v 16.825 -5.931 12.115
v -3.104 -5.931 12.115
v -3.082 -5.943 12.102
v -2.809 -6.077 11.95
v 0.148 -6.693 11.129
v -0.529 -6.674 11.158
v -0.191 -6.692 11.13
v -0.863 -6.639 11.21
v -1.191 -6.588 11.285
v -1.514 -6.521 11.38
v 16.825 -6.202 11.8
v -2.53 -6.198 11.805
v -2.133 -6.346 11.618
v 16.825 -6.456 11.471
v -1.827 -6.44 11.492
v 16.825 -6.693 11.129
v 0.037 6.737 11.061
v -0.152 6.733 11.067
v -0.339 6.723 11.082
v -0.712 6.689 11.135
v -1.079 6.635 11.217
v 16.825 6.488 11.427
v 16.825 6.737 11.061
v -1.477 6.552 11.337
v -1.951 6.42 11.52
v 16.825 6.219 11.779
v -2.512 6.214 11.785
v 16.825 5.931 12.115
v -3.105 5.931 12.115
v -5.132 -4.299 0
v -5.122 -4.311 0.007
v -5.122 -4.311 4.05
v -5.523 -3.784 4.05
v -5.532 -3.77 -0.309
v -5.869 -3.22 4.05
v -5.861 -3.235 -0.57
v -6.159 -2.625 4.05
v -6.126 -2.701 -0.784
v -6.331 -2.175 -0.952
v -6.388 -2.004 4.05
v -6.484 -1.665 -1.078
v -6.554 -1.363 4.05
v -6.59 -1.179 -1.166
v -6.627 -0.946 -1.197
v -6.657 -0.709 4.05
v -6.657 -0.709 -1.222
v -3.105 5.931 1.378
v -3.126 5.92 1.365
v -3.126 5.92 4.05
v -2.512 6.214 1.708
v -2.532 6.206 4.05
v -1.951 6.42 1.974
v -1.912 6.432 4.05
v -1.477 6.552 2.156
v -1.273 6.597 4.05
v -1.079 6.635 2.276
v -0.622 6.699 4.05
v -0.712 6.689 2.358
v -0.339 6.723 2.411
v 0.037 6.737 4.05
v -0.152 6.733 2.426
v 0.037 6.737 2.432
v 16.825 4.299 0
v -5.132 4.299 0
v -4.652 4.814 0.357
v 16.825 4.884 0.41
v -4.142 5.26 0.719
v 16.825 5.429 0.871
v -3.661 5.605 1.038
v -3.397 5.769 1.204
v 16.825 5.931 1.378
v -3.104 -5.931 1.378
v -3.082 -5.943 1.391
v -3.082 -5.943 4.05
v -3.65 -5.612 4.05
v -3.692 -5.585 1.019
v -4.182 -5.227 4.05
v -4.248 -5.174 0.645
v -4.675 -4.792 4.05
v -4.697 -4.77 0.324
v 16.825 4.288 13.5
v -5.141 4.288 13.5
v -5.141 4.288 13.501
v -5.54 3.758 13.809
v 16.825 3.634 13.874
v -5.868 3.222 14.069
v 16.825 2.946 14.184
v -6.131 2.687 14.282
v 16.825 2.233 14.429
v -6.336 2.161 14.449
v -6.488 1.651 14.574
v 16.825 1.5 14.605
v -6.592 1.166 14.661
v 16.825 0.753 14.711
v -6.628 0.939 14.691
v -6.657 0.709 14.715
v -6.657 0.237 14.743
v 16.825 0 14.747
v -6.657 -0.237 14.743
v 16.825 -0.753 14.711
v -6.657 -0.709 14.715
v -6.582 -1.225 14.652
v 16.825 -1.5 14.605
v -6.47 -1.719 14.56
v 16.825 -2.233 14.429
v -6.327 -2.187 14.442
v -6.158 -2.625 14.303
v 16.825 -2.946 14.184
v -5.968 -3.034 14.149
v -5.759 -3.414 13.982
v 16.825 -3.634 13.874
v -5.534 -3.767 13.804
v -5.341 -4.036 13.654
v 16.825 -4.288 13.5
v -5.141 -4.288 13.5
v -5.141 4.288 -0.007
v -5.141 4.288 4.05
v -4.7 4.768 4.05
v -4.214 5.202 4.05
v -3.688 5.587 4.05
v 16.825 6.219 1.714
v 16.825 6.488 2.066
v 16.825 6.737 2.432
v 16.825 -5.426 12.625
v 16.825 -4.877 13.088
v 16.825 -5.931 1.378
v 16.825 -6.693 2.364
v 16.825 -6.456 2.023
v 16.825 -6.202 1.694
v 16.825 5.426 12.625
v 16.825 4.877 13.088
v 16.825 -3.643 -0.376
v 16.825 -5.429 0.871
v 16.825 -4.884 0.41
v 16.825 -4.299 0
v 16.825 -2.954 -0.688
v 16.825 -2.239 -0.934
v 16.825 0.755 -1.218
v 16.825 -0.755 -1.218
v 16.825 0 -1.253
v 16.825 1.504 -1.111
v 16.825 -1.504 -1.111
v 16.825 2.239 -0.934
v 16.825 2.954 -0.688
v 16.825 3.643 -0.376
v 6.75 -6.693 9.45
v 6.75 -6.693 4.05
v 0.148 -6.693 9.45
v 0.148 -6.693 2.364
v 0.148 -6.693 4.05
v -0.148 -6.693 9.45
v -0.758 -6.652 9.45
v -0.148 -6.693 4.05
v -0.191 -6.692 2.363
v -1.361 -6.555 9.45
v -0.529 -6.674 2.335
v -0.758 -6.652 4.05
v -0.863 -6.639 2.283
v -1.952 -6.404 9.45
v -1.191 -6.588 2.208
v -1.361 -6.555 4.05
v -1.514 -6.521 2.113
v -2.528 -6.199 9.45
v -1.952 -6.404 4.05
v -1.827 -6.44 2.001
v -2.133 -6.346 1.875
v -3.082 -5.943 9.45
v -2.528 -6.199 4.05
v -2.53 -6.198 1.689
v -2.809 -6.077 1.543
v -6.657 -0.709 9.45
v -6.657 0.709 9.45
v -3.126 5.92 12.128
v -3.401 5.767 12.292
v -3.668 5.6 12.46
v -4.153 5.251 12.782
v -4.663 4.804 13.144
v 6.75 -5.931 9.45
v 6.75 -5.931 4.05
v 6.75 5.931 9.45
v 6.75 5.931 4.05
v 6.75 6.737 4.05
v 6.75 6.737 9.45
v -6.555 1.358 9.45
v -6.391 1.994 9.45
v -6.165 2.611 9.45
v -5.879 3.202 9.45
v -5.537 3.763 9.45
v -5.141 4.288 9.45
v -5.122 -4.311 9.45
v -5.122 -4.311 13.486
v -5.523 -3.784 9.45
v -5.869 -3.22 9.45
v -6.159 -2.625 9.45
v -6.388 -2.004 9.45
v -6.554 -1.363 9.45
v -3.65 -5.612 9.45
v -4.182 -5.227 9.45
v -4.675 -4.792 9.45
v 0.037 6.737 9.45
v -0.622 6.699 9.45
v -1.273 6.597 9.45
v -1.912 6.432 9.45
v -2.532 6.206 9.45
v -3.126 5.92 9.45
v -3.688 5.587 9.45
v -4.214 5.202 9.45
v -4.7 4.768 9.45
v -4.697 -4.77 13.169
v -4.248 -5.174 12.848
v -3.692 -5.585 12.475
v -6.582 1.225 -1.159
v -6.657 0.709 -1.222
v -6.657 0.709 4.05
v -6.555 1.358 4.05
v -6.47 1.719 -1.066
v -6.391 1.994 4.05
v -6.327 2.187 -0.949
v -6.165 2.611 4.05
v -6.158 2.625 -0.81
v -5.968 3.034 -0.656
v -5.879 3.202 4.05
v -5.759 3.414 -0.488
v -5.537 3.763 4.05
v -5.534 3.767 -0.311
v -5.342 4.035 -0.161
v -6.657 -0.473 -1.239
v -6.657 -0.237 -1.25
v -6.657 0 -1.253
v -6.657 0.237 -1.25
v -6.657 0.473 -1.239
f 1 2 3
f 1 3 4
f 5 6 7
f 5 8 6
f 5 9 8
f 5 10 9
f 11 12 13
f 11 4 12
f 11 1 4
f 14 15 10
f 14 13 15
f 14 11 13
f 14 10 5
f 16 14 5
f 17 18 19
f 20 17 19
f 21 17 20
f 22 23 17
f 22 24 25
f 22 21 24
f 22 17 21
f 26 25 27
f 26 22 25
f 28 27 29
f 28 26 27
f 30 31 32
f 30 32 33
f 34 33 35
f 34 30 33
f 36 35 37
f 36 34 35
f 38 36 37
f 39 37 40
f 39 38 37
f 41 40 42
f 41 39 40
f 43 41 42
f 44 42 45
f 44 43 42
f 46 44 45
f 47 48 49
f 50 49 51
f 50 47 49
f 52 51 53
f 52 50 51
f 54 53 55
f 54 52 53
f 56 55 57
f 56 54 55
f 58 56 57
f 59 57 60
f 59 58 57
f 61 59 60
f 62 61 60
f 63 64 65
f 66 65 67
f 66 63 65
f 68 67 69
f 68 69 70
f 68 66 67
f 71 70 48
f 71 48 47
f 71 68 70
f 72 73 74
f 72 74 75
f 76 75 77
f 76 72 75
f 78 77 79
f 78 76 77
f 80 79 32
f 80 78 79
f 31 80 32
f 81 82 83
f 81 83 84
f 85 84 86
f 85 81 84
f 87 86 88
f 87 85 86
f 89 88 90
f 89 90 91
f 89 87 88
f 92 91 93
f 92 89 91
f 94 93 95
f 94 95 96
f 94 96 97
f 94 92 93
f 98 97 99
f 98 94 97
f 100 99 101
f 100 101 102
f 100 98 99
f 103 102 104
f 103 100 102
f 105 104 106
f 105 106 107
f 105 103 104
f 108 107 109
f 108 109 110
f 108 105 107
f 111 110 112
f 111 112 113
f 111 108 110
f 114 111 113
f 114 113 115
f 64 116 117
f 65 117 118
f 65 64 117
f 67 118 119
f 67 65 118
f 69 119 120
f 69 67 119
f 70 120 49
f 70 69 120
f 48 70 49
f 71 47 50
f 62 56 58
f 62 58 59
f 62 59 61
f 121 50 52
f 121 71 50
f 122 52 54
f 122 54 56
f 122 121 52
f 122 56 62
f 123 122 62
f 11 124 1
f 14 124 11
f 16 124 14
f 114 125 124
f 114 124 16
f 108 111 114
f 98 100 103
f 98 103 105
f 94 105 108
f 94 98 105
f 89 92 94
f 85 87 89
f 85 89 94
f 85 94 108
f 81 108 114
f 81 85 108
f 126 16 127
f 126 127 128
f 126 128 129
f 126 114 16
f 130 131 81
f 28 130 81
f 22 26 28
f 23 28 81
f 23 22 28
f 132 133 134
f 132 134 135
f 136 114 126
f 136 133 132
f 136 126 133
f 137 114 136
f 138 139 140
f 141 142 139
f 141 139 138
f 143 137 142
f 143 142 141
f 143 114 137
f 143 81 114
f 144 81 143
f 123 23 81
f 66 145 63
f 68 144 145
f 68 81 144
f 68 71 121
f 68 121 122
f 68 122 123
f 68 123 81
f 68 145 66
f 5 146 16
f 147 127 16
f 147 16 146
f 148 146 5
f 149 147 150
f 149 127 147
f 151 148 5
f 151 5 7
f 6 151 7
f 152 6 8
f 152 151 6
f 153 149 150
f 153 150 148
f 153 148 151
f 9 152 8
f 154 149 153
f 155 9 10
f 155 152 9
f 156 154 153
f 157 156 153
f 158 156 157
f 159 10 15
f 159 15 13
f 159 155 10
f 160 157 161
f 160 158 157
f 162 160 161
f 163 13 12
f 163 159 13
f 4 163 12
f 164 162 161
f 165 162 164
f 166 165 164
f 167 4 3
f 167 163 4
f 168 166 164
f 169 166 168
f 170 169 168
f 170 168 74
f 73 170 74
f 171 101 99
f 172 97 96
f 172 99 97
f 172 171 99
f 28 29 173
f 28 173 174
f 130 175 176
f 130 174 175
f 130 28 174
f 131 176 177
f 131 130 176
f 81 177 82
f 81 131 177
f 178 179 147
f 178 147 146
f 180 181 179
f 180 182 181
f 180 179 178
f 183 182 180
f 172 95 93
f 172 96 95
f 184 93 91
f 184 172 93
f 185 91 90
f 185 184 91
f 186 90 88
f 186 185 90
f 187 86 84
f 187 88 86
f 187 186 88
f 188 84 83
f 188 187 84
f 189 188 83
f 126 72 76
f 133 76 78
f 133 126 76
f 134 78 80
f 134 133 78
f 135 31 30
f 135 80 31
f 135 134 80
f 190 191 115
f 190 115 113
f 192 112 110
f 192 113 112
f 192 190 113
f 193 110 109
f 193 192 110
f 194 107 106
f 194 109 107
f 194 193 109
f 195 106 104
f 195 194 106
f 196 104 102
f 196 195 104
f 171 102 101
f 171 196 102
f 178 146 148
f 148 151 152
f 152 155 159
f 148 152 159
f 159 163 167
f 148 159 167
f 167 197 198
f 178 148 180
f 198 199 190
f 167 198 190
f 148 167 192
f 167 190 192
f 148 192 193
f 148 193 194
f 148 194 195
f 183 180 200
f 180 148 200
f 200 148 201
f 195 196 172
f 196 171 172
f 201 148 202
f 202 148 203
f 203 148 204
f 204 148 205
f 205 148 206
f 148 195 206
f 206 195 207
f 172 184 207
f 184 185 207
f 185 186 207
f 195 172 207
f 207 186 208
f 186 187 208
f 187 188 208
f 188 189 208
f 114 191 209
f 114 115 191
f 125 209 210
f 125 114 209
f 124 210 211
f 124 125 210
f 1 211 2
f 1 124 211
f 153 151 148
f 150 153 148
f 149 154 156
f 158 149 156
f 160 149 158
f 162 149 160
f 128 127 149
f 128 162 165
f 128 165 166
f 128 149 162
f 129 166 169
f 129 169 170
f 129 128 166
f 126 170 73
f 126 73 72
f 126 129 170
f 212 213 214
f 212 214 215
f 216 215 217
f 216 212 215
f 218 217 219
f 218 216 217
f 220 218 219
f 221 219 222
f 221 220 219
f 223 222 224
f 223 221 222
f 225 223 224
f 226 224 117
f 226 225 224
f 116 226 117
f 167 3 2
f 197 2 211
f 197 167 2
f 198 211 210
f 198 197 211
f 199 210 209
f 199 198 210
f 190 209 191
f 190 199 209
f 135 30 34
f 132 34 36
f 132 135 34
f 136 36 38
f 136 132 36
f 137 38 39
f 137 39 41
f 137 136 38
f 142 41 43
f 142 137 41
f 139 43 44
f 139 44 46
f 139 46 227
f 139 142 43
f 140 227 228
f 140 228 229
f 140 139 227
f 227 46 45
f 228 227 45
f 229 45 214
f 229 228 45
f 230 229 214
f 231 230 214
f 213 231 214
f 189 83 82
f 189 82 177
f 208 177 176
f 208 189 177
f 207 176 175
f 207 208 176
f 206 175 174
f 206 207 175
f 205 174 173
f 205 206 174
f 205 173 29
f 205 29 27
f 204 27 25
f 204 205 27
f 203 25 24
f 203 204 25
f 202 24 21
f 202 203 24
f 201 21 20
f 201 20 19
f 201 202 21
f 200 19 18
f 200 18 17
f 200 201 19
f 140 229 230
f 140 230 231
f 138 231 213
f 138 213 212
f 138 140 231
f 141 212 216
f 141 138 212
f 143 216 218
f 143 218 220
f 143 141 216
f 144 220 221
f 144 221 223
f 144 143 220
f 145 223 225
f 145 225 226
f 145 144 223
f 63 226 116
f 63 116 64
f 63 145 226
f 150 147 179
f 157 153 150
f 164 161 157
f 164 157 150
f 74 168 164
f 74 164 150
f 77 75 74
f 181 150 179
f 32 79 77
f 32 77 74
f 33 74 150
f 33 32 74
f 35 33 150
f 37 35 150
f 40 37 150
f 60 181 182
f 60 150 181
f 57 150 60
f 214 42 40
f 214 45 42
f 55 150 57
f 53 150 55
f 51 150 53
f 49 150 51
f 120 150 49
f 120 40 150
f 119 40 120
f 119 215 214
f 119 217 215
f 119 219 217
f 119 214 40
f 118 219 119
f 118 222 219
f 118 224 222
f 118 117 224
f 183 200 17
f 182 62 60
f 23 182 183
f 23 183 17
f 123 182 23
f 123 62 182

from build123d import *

# Parameters (mm, degrees)
BOSS_EXTRUDE1_DEPTH = 13.5
SKETCH2_W           = 5.4
SKETCH2_H           = 14
CUT_EXTRUDE1_DEPTH  = 13.5
SKETCH3_R           = 12.152813435
SKETCH3_R_2         = 8
CUT_EXTRUDE2_DEPTH  = 24.574911634
BOSS_EXTRUDE2_DEPTH = 32.5
CUT_EXTRUDE4_DEPTH  = 25.746559571
SKETCH8_W           = 15.715396091
SKETCH8_H           = 5.4
CUT_EXTRUDE5_DEPTH  = 23.5


with BuildPart() as part:
    # Sketch1 → Boss-Extrude1 (new body)
    with BuildSketch(Plane.XY):
        with BuildLine():
            Line((-6.75, 0.697518811), (-6.75, -0.720756429))
            ThreePointArc((-6.75, -0.720756429), (-5.635274328, -3.766828408), (-3.219489146, -5.931349089))
            Line((-3.219489146, -5.931349089), (16.824911634, -5.931349089))
            Line((16.824911634, -5.931349089), (16.824911634, 5.931349089))
            Line((16.824911634, 5.931349089), (-3.175088366, 5.931349089))
            ThreePointArc((-3.175088366, 5.931349089), (-5.621180267, 3.764308263), (-6.75, 0.697518811))
        make_face()
    extrude(amount=BOSS_EXTRUDE1_DEPTH)

    # Sketch2 → Cut-Extrude1 (cut)
    with BuildSketch(Plane.ZY.offset(6.75)):
        with Locations((6.75, 0)):
            Rectangle(SKETCH2_W, SKETCH2_H)
    extrude(amount=-CUT_EXTRUDE1_DEPTH, mode=Mode.SUBTRACT)

    # Sketch3 → Cut-Extrude2 (cut, through all)
    with BuildSketch(Plane(origin=(16.824911634, 0, 0), x_dir=(0, 0, -1), z_dir=(1, 0, 0))):
        with Locations((-6.746559471, 0)):
            Circle(SKETCH3_R)
        with Locations((-6.746559471, 0)):
            Circle(SKETCH3_R_2, mode=Mode.SUBTRACT)
    extrude(amount=-CUT_EXTRUDE2_DEPTH, mode=Mode.SUBTRACT)

    # Sketch4 → Boss-Extrude2 (add)
    with BuildSketch(Plane(origin=(16.824911634, 0, 0), x_dir=(0, 0, -1), z_dir=(1, 0, 0))):
        with BuildLine():
            Line((-1.37821727, -5.931349089), (-12.114901672, -5.931349089))
            ThreePointArc((-12.114901672, -5.931349089), (-6.746559471, -8), (-1.37821727, -5.931349089))
        make_face()
        with BuildLine():
            Line((-13.5, -4.288477704), (-13.5, 4.288477704))
            ThreePointArc((-13.5, 4.288477704), (-14.746559471, 0), (-13.5, -4.288477704))
        make_face()
        with BuildLine():
            ThreePointArc((-1.37821727, 5.931349089), (-6.746559471, 8), (-12.114901672, 5.931349089))
            Line((-12.114901672, 5.931349089), (-1.37821727, 5.931349089))
        make_face()
        with BuildLine():
            ThreePointArc((1.253440529, 0), (0.933690387, 2.239143166), (0, 4.299294745))
            Line((0, 4.299294745), (0, -4.299294745))
            ThreePointArc((0, -4.299294745), (0.933690387, -2.239143166), (1.253440529, 0))
        make_face()
    extrude(amount=-BOSS_EXTRUDE2_DEPTH)

    # Sketch7 → Cut-Extrude4 (cut, through all)
    with BuildSketch(Plane.XY.offset(-10)):
        with BuildLine():
            Line((-6.656945588, -0.70913762), (-6.656945588, 0.70913762))
            ThreePointArc((-6.656945588, 0.70913762), (-6.164537152, 2.610801109), (-5.141365169, 4.287675936))
            ThreePointArc((-5.141365169, 4.287675936), (-4.213671695, 5.202189114), (-3.126434734, 5.91973028))
            ThreePointArc((-3.126434734, 5.91973028), (-1.594815167, 6.522683652), (0.037211277, 6.736928732))
            Line((0.037211277, 6.736928732), (17.631347577, 6.736928732))
            Line((17.631347577, 6.736928732), (17.631347577, 9.936708938))
            Line((17.631347577, 9.936708938), (-17.152869805, 9.936708938))
            Line((-17.152869805, 9.936708938), (-17.769305726, -9.133185925))
            Line((-17.769305726, -9.133185925), (18.753818668, -9.133185925))
            Line((18.753818668, -9.133185925), (18.753818668, -6.692966124))
            Line((18.753818668, -6.692966124), (0.148341476, -6.692966124))
            ThreePointArc((0.148341476, -6.692966124), (-1.514021871, -6.521160825), (-3.082033954, -5.942967898))
            ThreePointArc((-3.082033954, -5.942967898), (-4.182346183, -5.227406732), (-5.121896627, -4.310913554))
            ThreePointArc((-5.121896627, -4.310913554), (-6.158610107, -2.62475185), (-6.656945588, -0.70913762))
        make_face()
    extrude(amount=CUT_EXTRUDE4_DEPTH, mode=Mode.SUBTRACT)

    # Sketch8 → Cut-Extrude5 (cut)
    with BuildSketch(Plane.XZ.offset(6.692966124)):
        with Locations((-1.107698046, 6.75)):
            Rectangle(SKETCH8_W, SKETCH8_H)
    extrude(amount=-CUT_EXTRUDE5_DEPTH, mode=Mode.SUBTRACT)


solid = part.part
